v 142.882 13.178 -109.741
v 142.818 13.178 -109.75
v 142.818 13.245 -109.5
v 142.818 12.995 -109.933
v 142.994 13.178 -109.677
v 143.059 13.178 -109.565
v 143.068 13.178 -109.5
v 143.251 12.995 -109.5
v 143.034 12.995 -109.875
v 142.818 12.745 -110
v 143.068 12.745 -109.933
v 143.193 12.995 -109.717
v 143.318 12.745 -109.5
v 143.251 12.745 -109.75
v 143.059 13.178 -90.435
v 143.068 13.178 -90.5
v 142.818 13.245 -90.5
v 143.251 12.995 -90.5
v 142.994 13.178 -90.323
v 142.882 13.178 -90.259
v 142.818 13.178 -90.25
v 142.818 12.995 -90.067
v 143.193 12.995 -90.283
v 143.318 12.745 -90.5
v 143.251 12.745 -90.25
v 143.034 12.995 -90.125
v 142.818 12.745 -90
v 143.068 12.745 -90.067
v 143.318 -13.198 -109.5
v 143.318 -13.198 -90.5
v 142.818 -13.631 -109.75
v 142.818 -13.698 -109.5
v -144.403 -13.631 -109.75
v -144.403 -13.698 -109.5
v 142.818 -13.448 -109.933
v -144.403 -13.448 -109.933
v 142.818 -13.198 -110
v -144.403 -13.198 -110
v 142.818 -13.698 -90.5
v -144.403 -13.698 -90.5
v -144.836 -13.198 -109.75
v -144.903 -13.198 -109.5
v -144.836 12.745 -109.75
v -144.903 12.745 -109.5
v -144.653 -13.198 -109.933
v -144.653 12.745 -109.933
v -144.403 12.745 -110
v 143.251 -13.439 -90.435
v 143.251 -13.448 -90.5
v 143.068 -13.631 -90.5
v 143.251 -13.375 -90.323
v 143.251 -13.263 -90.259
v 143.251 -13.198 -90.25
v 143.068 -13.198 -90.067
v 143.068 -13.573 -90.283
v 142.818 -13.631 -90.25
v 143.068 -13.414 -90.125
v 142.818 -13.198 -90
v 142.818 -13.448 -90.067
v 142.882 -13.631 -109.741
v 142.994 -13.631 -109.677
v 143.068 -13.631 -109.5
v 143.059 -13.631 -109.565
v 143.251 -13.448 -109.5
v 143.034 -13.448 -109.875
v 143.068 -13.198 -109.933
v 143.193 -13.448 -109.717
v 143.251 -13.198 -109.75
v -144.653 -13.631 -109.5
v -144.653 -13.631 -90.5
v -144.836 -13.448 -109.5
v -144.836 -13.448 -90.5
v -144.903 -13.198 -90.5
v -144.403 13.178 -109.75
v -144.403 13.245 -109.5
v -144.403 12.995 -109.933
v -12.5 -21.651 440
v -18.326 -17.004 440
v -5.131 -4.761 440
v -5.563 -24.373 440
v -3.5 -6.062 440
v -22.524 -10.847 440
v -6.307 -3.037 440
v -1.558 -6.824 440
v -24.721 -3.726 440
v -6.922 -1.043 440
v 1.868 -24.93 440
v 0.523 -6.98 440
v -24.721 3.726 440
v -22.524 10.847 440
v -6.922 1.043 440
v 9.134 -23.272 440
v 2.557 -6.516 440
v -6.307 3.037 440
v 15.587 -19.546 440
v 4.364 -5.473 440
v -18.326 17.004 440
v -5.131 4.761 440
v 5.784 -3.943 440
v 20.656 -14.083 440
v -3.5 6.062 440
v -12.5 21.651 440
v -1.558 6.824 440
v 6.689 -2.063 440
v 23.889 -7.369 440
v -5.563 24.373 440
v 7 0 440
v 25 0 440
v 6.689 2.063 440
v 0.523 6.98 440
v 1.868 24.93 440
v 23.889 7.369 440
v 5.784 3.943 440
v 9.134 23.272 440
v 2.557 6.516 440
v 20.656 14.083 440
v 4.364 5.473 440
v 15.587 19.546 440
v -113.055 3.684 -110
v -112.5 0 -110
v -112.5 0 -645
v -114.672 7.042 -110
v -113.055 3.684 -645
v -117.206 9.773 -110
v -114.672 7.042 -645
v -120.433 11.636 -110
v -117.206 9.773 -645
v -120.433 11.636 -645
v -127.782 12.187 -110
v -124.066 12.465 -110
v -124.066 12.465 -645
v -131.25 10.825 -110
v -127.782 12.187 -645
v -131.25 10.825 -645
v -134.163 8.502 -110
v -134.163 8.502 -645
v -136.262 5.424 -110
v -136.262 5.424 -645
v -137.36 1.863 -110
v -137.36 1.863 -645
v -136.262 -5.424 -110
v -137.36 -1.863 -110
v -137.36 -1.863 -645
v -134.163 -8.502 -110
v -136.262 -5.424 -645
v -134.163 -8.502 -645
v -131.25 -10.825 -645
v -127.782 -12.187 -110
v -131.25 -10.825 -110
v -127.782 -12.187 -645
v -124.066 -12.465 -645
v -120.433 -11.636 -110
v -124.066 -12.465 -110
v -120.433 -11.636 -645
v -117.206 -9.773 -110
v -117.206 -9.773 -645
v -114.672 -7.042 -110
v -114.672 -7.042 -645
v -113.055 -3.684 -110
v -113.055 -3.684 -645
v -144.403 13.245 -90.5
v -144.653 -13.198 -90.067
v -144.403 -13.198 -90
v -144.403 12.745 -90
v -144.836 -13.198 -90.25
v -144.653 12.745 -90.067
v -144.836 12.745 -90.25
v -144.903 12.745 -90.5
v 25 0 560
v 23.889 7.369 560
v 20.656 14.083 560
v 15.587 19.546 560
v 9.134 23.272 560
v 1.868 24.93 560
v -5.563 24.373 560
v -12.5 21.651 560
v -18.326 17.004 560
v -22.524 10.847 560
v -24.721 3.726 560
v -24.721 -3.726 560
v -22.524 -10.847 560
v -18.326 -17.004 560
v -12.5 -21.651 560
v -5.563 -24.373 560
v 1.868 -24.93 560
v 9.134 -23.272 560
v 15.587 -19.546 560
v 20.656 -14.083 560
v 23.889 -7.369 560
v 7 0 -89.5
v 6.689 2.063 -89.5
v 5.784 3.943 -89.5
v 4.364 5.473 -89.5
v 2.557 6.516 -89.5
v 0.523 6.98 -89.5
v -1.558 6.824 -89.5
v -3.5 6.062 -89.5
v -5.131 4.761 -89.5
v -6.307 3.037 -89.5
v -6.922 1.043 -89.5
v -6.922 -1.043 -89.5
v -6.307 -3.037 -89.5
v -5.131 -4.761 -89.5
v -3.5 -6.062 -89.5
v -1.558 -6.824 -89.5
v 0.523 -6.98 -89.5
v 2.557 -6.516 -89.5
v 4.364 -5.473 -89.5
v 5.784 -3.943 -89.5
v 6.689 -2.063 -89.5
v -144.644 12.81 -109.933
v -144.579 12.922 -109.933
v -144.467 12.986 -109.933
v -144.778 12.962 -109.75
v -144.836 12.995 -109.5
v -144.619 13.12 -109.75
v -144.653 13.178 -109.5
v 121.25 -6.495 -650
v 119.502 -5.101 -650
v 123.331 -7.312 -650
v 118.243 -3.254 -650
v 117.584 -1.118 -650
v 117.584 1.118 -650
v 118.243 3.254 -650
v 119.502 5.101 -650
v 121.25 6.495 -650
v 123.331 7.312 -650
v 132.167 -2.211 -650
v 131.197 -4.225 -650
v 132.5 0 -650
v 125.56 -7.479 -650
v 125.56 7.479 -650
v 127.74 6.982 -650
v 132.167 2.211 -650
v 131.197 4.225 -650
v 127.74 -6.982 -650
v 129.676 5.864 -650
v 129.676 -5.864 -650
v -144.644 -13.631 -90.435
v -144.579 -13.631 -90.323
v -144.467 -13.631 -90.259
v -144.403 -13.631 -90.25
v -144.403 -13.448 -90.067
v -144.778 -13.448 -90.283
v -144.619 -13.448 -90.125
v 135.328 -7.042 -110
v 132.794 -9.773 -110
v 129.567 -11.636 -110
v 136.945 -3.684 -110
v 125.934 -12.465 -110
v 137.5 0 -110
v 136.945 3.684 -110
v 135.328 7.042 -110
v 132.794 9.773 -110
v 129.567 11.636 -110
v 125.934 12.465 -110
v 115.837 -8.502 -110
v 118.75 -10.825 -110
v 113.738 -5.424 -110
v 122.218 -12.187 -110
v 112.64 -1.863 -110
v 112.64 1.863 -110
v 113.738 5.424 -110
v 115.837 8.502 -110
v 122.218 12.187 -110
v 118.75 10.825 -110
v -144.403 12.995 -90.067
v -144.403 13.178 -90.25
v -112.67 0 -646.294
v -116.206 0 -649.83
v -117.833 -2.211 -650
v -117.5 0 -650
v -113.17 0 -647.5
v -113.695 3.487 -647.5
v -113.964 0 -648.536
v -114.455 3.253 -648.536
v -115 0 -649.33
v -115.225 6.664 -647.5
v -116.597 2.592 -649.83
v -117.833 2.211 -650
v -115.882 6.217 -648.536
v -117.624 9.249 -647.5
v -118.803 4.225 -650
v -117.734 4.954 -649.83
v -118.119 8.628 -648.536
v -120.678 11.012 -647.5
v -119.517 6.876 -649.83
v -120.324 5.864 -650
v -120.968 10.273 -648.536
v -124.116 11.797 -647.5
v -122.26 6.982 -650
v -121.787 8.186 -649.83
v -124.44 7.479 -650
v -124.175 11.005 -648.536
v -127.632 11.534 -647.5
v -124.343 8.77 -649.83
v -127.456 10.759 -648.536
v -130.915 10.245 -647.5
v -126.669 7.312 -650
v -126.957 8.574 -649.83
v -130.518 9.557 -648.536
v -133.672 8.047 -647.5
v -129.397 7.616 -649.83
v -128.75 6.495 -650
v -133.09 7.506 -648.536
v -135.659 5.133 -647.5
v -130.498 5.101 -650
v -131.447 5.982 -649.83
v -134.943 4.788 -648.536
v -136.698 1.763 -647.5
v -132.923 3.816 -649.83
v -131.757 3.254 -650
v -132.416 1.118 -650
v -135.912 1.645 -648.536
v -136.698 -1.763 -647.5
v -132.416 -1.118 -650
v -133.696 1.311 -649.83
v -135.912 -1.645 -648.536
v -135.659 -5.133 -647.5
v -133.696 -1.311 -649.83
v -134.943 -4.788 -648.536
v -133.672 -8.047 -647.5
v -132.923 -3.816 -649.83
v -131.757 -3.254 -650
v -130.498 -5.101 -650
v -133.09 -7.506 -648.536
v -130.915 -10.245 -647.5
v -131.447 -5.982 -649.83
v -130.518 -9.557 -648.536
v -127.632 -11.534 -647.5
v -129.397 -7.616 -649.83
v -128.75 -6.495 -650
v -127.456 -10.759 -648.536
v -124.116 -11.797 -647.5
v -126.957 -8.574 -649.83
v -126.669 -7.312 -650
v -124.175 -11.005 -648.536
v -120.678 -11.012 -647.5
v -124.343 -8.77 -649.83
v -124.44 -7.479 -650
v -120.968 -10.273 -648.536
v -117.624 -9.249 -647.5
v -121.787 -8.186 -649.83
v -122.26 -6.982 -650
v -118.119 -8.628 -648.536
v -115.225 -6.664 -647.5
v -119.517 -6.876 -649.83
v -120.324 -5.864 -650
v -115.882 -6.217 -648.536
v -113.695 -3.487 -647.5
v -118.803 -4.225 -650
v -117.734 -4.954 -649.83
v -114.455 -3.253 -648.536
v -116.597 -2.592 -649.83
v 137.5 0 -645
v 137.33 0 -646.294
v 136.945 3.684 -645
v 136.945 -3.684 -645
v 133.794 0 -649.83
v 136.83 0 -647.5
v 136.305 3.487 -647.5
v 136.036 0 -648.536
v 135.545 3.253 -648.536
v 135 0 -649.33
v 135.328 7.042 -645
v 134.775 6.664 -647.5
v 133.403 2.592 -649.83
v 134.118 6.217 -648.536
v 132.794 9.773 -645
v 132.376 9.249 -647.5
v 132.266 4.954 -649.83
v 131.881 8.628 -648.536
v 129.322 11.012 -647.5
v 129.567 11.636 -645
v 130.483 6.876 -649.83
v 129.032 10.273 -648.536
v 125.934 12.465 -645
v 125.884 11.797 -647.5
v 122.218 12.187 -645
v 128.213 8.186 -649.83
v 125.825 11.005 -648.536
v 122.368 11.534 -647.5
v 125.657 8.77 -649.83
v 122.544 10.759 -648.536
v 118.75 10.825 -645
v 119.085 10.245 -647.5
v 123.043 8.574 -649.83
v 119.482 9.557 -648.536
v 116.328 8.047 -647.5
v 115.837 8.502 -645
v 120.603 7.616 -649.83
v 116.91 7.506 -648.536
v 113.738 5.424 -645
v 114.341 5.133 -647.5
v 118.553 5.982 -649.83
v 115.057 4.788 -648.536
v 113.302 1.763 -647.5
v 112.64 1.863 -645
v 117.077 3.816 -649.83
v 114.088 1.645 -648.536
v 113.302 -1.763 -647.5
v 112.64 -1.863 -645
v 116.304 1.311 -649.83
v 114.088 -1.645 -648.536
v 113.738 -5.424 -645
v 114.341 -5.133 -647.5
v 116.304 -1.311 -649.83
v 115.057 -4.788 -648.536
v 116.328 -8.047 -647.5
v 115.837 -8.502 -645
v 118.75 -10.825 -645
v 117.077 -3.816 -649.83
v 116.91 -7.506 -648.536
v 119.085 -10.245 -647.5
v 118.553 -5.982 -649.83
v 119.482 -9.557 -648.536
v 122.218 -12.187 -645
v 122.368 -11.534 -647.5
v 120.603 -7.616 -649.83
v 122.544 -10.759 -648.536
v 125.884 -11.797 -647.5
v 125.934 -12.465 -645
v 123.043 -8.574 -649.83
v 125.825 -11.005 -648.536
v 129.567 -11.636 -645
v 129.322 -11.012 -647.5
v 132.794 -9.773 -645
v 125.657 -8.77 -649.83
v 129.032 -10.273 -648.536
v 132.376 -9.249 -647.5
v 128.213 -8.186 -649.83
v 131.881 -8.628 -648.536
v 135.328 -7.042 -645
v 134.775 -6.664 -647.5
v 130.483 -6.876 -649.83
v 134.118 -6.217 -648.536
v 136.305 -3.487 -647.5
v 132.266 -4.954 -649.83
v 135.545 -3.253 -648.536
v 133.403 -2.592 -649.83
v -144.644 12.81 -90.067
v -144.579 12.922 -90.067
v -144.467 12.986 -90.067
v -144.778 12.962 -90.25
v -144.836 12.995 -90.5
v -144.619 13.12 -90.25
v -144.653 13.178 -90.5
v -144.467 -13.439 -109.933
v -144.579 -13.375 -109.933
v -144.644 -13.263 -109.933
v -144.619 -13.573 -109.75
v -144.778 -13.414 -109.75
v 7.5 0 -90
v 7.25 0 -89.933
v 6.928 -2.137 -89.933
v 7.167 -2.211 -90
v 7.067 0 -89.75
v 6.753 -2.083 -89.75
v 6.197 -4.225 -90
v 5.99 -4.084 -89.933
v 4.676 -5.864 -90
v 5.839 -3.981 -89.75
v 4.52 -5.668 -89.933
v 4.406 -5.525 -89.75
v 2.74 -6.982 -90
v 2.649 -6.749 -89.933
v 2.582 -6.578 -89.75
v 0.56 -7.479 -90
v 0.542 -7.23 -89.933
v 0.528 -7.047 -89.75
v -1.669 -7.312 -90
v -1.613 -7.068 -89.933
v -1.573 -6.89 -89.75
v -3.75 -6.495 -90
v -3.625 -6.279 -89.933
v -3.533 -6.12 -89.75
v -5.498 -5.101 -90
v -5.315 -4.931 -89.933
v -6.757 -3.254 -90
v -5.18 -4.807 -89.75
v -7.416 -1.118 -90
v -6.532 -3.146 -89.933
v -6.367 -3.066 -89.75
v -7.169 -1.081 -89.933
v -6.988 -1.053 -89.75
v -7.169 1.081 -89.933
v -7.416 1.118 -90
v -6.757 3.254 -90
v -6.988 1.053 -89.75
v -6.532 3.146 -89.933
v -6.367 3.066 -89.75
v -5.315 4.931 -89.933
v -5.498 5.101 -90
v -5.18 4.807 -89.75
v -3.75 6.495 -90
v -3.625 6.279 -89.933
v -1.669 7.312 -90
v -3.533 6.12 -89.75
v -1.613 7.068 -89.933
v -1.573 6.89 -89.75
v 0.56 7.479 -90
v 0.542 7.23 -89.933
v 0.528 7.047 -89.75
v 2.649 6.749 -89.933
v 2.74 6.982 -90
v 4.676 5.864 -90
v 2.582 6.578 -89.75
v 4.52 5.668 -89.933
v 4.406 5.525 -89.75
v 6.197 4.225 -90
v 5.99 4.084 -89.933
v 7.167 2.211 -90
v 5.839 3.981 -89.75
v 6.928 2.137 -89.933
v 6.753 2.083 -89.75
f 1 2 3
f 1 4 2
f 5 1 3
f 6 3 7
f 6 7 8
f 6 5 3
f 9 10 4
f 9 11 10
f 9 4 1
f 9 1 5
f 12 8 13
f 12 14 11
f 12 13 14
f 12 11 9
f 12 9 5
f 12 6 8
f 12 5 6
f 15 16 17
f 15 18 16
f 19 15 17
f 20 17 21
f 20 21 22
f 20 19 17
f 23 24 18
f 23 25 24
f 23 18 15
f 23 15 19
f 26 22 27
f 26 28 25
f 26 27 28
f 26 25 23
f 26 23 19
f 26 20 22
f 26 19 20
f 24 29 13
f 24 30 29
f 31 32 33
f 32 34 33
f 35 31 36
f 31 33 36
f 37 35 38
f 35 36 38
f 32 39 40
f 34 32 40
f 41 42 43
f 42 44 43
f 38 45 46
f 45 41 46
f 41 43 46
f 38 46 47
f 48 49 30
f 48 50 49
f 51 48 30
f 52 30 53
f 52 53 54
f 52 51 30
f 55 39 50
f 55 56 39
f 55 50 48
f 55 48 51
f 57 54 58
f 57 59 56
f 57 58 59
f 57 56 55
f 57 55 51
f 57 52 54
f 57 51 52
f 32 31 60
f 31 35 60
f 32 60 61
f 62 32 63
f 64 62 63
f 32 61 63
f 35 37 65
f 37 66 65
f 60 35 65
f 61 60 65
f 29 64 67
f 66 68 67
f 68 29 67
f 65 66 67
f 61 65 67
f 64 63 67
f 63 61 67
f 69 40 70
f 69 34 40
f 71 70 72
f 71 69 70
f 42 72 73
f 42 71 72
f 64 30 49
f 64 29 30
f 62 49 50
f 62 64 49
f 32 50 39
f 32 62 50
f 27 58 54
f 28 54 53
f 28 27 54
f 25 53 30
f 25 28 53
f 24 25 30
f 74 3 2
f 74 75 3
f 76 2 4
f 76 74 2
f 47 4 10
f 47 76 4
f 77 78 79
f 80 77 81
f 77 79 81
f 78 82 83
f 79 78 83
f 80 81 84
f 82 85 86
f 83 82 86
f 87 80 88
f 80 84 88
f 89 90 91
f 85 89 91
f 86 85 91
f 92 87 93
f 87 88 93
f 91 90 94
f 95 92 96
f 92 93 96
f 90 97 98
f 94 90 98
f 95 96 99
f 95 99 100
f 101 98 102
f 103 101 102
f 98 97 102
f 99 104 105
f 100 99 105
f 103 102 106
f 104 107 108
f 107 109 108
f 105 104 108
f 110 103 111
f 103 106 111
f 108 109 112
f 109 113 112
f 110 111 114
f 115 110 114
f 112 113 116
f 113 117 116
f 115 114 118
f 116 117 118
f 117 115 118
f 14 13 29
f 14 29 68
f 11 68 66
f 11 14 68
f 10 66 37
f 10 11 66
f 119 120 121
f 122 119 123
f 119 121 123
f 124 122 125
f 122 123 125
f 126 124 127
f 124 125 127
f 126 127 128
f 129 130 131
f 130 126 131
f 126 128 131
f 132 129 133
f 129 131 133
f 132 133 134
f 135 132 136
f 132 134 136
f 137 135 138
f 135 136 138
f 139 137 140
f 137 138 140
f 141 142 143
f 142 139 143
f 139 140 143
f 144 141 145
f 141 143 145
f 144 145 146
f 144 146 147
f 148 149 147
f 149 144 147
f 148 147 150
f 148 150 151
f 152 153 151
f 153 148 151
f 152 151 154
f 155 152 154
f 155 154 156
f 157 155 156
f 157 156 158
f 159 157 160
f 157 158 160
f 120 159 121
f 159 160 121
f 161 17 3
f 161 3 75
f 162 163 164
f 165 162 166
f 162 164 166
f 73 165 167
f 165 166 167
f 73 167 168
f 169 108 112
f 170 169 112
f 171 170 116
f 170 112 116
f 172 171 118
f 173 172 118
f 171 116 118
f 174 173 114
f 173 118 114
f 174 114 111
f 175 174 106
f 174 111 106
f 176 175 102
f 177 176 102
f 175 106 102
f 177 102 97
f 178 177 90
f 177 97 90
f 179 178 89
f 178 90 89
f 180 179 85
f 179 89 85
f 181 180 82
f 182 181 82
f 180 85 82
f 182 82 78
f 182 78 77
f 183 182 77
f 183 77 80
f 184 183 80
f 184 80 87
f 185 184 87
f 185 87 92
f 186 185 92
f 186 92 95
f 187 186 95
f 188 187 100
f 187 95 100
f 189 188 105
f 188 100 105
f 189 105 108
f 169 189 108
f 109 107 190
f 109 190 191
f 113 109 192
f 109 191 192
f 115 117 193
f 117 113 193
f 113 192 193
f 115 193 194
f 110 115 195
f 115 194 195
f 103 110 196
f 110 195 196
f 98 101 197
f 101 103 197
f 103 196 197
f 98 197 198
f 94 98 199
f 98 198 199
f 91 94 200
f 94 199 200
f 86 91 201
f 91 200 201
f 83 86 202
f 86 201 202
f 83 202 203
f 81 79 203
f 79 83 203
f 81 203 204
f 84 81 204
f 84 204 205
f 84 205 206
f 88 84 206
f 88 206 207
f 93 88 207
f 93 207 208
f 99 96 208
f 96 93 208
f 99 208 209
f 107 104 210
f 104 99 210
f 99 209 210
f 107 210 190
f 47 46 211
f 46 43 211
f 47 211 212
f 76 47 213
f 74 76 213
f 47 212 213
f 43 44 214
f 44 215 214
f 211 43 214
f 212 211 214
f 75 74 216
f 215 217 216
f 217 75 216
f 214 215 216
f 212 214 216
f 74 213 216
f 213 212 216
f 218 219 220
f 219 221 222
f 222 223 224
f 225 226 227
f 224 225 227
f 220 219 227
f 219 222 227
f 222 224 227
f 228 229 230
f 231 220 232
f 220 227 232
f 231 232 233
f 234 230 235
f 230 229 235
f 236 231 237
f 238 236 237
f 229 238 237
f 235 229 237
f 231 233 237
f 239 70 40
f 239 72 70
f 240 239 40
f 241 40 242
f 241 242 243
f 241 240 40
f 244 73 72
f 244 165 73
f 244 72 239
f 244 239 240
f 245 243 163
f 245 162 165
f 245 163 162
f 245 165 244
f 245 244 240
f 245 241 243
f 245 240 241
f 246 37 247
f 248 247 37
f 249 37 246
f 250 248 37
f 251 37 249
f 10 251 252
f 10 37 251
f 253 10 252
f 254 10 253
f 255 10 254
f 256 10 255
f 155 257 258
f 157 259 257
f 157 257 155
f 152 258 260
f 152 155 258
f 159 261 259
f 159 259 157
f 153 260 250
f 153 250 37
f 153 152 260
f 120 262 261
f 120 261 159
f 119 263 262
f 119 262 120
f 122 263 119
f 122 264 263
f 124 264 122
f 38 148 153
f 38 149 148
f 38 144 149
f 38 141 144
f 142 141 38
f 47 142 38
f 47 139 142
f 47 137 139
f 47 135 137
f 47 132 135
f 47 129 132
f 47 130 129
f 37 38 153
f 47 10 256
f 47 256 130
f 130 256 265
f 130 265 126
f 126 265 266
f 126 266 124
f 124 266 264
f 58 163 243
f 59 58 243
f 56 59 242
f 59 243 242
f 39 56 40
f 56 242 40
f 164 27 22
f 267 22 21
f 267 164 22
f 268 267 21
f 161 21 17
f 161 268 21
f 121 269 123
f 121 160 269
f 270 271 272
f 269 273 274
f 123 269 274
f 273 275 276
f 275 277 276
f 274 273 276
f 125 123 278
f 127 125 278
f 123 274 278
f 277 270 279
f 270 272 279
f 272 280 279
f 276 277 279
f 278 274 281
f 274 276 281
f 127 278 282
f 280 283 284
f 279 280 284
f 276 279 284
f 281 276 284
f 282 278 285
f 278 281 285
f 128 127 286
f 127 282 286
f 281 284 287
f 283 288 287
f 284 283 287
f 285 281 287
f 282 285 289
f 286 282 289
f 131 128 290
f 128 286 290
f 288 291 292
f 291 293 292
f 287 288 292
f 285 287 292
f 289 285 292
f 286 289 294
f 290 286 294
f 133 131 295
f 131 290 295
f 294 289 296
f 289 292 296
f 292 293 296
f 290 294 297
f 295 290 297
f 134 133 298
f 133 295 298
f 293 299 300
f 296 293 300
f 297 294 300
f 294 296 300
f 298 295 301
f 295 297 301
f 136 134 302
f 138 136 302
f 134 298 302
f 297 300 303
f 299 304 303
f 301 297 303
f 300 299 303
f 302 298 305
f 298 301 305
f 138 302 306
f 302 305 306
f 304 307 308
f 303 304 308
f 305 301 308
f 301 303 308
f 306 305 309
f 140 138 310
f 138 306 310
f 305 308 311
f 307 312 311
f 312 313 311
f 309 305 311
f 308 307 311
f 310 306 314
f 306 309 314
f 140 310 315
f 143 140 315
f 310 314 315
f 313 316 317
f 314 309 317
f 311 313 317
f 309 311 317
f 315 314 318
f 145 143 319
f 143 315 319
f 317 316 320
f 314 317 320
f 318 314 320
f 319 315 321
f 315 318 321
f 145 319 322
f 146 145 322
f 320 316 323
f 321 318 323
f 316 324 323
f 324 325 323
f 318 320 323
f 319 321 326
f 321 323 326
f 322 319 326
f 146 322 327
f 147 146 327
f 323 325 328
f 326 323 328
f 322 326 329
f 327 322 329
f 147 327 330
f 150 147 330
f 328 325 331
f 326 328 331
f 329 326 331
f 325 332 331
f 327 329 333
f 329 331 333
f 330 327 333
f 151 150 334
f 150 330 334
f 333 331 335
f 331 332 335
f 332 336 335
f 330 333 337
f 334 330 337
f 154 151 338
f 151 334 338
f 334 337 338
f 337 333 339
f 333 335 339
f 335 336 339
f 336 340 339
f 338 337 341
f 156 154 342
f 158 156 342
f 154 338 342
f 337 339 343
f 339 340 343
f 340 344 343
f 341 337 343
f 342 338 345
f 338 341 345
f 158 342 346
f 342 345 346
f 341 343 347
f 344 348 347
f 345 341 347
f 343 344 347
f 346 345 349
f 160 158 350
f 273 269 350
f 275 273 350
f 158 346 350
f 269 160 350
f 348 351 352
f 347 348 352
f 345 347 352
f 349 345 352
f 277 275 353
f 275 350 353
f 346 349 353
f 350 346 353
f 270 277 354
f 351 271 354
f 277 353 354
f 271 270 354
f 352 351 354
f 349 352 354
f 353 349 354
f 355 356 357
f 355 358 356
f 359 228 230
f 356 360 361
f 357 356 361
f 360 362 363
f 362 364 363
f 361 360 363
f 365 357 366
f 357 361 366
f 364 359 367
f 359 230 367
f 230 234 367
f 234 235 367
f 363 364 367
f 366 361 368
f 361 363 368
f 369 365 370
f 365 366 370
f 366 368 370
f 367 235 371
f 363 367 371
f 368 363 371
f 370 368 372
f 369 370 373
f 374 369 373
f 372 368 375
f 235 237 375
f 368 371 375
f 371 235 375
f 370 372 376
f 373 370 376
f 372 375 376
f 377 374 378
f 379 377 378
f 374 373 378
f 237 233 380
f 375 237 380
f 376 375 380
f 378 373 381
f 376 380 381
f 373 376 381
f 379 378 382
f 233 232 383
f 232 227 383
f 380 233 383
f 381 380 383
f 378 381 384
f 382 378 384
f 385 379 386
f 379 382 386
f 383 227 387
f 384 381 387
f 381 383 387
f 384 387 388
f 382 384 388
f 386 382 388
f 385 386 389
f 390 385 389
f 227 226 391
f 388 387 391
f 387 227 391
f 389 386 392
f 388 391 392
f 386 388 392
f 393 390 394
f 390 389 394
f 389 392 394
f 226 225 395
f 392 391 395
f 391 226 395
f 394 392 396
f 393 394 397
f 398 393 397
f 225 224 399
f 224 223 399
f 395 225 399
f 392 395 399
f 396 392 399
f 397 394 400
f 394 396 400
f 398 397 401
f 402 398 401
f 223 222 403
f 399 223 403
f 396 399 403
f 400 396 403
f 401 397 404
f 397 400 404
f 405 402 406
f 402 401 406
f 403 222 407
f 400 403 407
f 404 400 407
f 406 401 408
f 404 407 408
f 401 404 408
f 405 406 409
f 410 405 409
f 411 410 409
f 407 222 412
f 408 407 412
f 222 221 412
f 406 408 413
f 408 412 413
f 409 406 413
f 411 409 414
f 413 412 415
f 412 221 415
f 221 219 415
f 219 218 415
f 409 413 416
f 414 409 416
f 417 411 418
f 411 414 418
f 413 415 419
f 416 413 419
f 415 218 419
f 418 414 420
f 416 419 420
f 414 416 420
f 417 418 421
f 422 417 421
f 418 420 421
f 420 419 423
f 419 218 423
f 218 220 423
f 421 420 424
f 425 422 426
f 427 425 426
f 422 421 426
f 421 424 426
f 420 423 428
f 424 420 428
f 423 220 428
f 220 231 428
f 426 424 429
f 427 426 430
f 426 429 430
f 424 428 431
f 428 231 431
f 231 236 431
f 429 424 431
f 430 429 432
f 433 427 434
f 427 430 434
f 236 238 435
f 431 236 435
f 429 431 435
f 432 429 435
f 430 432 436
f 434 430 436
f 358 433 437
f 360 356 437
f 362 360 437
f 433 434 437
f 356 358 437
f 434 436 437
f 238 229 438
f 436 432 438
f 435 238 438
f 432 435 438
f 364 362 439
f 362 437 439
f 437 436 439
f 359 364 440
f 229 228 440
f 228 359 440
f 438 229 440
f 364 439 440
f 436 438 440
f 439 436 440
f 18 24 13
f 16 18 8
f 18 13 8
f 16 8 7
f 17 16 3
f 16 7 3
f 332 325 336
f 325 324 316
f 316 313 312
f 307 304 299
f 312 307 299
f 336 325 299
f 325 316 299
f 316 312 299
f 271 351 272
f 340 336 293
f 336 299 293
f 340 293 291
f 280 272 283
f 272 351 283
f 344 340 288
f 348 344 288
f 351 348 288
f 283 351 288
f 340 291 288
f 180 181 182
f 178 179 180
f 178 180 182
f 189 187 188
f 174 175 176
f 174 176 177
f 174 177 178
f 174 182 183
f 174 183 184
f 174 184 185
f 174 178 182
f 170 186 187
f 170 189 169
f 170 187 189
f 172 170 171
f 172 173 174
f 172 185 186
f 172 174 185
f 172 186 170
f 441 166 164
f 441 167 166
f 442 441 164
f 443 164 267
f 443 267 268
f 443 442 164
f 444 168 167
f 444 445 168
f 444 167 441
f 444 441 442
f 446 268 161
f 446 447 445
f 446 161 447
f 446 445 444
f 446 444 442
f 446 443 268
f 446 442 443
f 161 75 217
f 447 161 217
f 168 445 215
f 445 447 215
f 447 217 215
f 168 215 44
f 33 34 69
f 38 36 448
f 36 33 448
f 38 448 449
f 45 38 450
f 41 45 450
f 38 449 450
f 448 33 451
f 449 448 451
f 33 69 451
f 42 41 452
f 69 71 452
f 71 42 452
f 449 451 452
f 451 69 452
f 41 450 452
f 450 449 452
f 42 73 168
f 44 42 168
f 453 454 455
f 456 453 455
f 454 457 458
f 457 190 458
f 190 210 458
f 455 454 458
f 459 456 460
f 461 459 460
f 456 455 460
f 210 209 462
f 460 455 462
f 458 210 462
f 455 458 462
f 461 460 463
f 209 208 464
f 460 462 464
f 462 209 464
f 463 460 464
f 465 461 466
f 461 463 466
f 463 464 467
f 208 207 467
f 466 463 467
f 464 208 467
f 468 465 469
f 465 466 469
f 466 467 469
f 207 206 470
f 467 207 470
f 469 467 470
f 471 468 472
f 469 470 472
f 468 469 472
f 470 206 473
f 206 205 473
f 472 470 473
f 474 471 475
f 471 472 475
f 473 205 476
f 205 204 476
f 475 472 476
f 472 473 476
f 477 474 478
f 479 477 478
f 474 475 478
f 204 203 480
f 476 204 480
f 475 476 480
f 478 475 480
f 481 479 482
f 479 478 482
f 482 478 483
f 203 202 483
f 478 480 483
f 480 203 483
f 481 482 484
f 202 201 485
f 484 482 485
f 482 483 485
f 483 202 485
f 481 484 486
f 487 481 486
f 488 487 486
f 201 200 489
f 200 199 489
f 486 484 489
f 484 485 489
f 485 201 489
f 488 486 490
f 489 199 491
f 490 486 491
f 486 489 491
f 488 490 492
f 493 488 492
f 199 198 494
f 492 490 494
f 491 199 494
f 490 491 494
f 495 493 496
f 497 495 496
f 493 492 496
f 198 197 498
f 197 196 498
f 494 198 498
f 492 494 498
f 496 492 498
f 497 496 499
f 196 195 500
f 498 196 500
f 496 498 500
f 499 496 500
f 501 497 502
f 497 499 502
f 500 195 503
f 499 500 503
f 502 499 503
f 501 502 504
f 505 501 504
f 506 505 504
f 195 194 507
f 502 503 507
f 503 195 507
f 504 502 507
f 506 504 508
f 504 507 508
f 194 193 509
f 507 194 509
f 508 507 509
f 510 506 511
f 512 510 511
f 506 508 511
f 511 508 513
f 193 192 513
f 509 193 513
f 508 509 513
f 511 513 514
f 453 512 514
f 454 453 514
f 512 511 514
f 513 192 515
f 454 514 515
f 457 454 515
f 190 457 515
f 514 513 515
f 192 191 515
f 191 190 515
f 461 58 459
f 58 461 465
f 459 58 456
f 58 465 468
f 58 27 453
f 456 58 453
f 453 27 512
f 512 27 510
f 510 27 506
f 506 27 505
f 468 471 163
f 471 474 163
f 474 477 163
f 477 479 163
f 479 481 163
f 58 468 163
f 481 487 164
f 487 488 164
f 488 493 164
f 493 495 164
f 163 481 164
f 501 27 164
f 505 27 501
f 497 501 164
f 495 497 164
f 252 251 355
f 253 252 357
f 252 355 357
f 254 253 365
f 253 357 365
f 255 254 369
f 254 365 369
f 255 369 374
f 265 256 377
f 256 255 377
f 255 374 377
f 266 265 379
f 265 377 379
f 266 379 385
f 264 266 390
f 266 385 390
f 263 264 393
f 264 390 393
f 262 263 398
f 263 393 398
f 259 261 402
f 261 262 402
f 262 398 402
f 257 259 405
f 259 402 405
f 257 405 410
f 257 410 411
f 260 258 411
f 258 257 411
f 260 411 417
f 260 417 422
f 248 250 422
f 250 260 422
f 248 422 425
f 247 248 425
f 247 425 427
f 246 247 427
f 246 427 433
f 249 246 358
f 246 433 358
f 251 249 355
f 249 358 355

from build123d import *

# Parameters (mm, degrees)
BOSS_EXTRUDE1_DEPTH      = 500
BOSS_EXTRUDE1_DEPTH_BACK = 100
SKETCH1_R                = 7
SKETCH4_R                = 12.5
BOSS_EXTRUDE2_DEPTH      = 550
BOSS_EXTRUDE2_2_DEPTH    = 550
BOSS_EXTRUDE3_DEPTH      = 10
BOSS_EXTRUDE3_DEPTH_BACK = 10
SKETCH5_W                = 288.220289941
SKETCH5_H                = 26.942823647
FILLET4_R                = 0.5
FILLET8_R                = 0.5
FILLET9_R                = 5
BOSS_EXTRUDE4_DEPTH      = 60
BOSS_EXTRUDE4_DEPTH_BACK = 60
SKETCH6_R                = 25


with BuildPart() as part:
    # Sketch1 → Boss-Extrude1 (new, two sides: drawn at the far end of the back side and taken through both)
    with BuildSketch(Plane.XY.offset(-BOSS_EXTRUDE1_DEPTH_BACK)):
        Circle(SKETCH1_R)
    extrude(amount=BOSS_EXTRUDE1_DEPTH + BOSS_EXTRUDE1_DEPTH_BACK)



with BuildPart() as body_2:
    # Sketch4 → Boss-Extrude2 (new body)
    with BuildSketch(Plane.XY.offset(-650)):
        with Locations((-125, 0)):
            Circle(SKETCH4_R)
    extrude(amount=BOSS_EXTRUDE2_DEPTH)


with BuildPart() as body_3:
    # Sketch4 → Boss-Extrude2 2 (new body)
    with BuildSketch(Plane.XY.offset(-650)):
        with Locations((125, 0)):
            Circle(SKETCH4_R)
    extrude(amount=BOSS_EXTRUDE2_2_DEPTH)


with BuildPart() as part_1:
    add(part.part)

    add(body_2.part)  # Boss-Extrude3 merges body 2

    add(body_3.part)  # Boss-Extrude3 merges body 3
    # Sketch5 → Boss-Extrude3 (add, two sides: drawn at the far end of the back side and taken through both)
    with BuildSketch(Plane(origin=(0, 0, -100), x_dir=(-1, 0, 0), z_dir=(0, 0, -1)).offset(-BOSS_EXTRUDE3_DEPTH_BACK)):
        with Locations((0.79243599, -0.226410282)):
            Rectangle(SKETCH5_W, SKETCH5_H)
    extrude(amount=BOSS_EXTRUDE3_DEPTH + BOSS_EXTRUDE3_DEPTH_BACK)

    # Fillet4
    fillet4_edges = [part_1.edges().sort_by_distance(p)[0] for p in [
        (-7, 0, -90),
    ]]
    fillet(fillet4_edges, radius=FILLET4_R)

    # Fillet8
    fillet8_edges = [part_1.edges().sort_by_distance(p)[0] for p in [
        (-144.90258096, 13.245001541, -100),
        (-144.90258096, -0.226410283, -90),
        (-144.90258096, -13.697822106, -100),
        (-0.79243599, -13.697822106, -90),
        (143.317708981, -0.226410283, -110),
        (-0.79243599, -13.697822106, -110),
        (-144.90258096, -0.226410283, -110),
        (-0.79243599, 13.245001541, -110),
        (143.317708981, -13.697822106, -100),
        (143.317708981, -0.226410283, -90),
        (143.317708981, 13.245001541, -100),
        (-0.79243599, 13.245001541, -90),
    ]]
    fillet(fillet8_edges, radius=FILLET8_R)

    # Fillet9
    fillet9_edges = [part_1.edges().sort_by_distance(p)[0] for p in [
        (-137.5, 0, -650),
        (112.5, 0, -650),
    ]]
    fillet(fillet9_edges, radius=FILLET9_R)

    # Sketch6 → Boss-Extrude4 (add, two sides: drawn at the far end of the back side and taken through both)
    with BuildSketch(Plane.XY.offset(500).offset(-BOSS_EXTRUDE4_DEPTH_BACK)):
        Circle(SKETCH6_R)
    extrude(amount=BOSS_EXTRUDE4_DEPTH + BOSS_EXTRUDE4_DEPTH_BACK)


solid = part_1.part
